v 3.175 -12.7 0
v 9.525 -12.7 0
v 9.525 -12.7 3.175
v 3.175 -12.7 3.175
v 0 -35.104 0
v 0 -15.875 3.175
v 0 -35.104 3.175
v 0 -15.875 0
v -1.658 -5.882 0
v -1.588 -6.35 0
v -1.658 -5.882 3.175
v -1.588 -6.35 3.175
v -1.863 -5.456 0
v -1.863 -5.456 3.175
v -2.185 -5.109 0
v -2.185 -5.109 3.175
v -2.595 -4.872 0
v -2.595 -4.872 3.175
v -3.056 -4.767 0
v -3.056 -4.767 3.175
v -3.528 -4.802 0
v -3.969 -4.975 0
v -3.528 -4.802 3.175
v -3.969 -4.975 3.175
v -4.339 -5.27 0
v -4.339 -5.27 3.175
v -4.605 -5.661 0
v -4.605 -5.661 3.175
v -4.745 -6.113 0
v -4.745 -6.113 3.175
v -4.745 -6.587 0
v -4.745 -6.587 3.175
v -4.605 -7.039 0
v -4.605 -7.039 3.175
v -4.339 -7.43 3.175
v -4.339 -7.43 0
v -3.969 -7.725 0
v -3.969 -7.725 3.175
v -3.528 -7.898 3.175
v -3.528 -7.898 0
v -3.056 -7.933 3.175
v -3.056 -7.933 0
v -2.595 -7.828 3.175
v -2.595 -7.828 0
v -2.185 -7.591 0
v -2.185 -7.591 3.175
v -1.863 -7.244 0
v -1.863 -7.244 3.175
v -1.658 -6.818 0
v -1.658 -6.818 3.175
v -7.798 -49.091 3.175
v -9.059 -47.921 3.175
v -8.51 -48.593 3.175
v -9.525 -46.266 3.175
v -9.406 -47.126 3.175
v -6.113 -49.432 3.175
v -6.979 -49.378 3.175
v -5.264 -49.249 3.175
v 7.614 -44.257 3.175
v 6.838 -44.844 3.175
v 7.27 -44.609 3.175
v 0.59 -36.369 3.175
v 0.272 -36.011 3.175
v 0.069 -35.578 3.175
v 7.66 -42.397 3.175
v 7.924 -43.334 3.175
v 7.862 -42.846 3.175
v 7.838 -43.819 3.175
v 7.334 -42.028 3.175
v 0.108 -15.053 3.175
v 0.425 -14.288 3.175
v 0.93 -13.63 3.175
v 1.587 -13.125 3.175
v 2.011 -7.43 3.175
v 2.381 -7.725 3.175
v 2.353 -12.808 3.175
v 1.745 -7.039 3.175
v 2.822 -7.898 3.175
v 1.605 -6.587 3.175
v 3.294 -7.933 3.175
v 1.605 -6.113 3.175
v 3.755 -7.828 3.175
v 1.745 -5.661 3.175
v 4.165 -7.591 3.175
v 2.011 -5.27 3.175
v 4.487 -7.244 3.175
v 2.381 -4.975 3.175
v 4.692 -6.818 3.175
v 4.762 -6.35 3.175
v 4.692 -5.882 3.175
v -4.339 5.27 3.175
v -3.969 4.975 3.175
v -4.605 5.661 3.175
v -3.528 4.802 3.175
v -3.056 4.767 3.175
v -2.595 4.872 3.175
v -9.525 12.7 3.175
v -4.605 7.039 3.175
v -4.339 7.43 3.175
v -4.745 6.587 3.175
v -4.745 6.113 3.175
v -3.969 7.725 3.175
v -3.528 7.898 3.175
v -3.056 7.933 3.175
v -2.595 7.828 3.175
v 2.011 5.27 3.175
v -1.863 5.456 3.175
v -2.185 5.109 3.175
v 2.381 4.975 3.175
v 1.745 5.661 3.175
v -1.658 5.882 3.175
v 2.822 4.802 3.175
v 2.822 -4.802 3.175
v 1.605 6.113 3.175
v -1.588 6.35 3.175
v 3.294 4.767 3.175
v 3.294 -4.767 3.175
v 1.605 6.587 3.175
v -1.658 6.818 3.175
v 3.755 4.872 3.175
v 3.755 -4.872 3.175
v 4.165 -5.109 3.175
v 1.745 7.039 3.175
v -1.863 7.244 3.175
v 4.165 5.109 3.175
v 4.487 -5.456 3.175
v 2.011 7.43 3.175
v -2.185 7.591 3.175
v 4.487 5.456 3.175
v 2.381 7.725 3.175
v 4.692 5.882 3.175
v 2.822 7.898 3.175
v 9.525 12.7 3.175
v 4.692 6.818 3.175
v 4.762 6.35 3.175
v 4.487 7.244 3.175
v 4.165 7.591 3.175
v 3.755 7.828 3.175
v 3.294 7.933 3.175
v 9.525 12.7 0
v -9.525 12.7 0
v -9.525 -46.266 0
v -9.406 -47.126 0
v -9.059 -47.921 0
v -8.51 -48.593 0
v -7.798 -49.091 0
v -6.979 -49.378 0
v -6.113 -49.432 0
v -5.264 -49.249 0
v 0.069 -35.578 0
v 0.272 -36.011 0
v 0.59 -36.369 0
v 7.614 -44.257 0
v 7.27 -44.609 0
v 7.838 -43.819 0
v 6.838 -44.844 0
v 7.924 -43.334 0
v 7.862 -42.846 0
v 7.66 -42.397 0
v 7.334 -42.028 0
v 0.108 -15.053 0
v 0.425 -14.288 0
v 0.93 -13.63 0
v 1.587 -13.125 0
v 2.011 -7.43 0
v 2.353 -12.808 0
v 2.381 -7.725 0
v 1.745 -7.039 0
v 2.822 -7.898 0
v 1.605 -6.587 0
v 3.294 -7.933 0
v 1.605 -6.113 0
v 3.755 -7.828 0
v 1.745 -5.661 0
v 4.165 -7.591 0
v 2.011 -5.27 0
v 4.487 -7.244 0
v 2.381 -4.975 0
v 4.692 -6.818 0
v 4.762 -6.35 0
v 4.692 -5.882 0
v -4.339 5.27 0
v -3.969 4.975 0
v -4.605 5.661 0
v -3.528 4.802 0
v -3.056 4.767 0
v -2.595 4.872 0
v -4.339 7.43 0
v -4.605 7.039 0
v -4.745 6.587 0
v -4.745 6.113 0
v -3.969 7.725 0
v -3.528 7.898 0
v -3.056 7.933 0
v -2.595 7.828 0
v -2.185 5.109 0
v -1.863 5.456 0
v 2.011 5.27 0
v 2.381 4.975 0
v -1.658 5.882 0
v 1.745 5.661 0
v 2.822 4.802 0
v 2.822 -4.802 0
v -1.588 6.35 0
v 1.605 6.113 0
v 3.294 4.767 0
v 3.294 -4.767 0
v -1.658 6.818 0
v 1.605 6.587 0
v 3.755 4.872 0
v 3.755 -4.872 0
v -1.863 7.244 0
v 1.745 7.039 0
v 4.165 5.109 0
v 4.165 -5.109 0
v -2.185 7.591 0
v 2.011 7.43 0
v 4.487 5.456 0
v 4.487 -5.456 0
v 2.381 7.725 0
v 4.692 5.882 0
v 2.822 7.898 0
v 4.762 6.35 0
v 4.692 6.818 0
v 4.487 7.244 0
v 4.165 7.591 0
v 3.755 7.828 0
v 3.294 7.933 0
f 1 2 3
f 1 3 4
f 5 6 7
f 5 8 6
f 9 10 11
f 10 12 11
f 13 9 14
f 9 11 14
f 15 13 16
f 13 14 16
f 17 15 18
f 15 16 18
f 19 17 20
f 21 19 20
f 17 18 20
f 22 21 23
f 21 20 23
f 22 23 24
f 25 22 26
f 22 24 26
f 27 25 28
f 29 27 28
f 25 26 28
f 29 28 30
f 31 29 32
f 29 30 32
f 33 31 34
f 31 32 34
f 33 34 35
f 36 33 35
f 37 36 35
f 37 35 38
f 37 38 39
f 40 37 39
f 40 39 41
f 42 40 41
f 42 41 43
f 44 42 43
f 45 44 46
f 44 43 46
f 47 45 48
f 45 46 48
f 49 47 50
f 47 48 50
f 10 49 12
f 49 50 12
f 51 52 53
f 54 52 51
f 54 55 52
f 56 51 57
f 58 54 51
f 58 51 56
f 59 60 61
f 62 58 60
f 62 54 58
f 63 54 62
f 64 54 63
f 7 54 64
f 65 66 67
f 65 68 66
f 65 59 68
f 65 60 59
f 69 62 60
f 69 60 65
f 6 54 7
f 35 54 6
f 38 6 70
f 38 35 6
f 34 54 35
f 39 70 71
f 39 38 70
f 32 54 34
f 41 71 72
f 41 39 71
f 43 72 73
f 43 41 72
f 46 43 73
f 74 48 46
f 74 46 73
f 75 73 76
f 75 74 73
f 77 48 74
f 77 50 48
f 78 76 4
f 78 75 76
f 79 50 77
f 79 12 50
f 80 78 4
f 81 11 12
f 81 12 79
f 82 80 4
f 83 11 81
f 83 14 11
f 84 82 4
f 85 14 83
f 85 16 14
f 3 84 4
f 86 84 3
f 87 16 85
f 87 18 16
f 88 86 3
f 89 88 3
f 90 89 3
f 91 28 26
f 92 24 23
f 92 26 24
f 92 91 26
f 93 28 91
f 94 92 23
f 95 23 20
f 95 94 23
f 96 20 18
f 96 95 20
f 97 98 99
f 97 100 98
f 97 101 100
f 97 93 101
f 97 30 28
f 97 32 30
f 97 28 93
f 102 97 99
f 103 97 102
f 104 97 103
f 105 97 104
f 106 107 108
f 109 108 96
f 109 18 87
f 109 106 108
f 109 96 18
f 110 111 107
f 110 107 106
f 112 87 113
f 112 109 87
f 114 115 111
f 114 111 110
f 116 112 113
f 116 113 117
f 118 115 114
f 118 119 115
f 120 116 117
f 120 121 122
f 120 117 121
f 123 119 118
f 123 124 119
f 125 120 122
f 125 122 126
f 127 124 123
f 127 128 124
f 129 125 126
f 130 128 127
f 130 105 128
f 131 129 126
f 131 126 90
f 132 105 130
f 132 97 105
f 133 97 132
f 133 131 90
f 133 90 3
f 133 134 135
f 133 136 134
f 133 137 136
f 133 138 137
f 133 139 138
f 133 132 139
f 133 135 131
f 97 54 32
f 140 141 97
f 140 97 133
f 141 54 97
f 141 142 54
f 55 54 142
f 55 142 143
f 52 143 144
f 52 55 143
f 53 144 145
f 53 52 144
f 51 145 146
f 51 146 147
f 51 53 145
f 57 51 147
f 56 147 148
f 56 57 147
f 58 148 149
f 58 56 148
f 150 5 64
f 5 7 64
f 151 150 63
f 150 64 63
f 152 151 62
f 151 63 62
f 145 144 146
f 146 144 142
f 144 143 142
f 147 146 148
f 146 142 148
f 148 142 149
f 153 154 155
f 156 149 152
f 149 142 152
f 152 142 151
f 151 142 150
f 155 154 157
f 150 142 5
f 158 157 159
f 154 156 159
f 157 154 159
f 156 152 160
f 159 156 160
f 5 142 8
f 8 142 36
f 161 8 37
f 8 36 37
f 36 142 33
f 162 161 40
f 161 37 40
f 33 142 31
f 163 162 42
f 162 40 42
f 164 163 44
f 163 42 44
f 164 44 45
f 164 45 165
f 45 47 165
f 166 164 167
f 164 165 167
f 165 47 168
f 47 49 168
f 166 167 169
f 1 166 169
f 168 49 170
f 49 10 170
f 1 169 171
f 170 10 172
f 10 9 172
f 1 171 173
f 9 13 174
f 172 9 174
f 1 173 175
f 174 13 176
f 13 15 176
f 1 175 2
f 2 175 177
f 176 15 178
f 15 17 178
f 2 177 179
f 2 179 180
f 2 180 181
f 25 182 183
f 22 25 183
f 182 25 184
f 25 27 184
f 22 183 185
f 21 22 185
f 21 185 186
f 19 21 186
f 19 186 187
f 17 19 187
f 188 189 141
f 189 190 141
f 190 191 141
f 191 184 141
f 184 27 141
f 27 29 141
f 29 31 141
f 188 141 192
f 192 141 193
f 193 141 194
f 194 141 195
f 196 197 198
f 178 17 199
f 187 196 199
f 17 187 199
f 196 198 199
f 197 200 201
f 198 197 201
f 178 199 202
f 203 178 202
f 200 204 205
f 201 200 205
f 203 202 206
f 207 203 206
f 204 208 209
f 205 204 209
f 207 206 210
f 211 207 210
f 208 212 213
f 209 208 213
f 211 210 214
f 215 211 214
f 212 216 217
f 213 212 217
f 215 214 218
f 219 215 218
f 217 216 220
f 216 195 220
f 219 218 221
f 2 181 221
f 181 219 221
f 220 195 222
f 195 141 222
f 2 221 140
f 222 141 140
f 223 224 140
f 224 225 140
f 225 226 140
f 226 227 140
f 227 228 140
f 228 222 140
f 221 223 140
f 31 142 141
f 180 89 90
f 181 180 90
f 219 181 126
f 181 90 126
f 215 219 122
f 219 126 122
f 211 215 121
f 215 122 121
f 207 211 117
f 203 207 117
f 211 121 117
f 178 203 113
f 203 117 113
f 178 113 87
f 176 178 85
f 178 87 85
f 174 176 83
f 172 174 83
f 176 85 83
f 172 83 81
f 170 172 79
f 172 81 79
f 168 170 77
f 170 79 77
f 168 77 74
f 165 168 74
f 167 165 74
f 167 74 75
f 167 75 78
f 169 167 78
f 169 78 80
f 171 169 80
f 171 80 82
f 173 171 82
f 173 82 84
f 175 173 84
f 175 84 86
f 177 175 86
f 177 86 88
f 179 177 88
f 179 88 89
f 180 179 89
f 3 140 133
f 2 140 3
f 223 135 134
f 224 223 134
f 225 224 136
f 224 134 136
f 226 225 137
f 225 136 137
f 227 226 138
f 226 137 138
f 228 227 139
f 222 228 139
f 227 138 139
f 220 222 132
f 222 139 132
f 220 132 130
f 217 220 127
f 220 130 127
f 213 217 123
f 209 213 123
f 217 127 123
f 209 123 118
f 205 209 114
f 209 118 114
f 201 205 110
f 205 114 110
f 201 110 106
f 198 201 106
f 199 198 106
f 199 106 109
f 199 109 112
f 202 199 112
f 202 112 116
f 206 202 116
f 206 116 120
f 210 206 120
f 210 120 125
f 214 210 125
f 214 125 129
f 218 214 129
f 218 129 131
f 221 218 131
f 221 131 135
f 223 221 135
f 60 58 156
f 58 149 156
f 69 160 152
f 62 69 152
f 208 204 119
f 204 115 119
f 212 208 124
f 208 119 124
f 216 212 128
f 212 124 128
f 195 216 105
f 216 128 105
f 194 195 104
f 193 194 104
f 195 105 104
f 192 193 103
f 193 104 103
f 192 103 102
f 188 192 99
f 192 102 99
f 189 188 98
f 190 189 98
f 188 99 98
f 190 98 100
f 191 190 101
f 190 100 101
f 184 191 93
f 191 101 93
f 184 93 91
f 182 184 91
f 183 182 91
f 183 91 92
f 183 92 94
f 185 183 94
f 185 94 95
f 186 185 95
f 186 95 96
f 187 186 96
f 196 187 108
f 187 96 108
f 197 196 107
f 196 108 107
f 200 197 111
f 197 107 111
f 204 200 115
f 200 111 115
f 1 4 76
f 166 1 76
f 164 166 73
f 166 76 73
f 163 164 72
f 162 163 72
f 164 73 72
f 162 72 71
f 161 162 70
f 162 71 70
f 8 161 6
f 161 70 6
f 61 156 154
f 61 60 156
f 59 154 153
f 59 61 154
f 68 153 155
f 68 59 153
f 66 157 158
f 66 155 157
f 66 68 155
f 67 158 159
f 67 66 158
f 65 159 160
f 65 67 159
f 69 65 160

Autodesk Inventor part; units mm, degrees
ref_plane "YZ Plane" through (0, 0, 0) normal (1, 0, 0) x (0, 1, 0)
ref_plane "XZ Plane" through (0, 0, 0) normal (0, 1, 0) x (-1, 0, 0)
ref_plane "XY Plane" through (0, 0, 0) normal (0, 0, 1) x (1, 0, 0)
sketch "Sketch1" plane through (0, 0, 0) normal (0, 0, 1) x (1, 0, 0)
  line L0 (9.525, -12.7) -> (-9.525, -12.7)
  line L1 (-9.525, -12.7) -> (-9.525, 12.7)
  line L2 (-9.525, 12.7) -> (9.525, 12.7)
  line L3 (9.525, 12.7) -> (9.525, -12.7)
  line L4 (9.525, -12.7) -> (-9.525, 12.7) construction
  line L5 (-9.525, -12.7) -> (9.525, 12.7) construction
  line L6 (-9.525, 12.7) -> (0, 12.7)
  line L7 (0, 12.7) -> (0, -50.8)
  line L8 (0, -50.8) -> (-9.525, -50.8)
  line L9 (-9.525, -50.8) -> (-9.525, 12.7)
  line L10 (-9.525, -50.8) -> (9.525, -43.8664)
  line L11 (-9.525, -50.8) -> (10.7476, -50.8) construction
  line L12 (9.525, -43.8664) -> (0, -35.8739)
  point P0 (0, 0)
  point P1 (0, -12.7)
  dimension "d0" = 19.05
  dimension "d1" = 25.4
  dimension "d2" = 63.5
  dimension "d3" = 20
  dimension "d4" = 60
extrude "Extrusion1" add sketch "Sketch1" along normal blind 3.175 contours L0 L7 L2 L3 | L7 L10 L9 L0 | L0 L1 L2 L7 | L12 L10 L7
sketch "Sketch2" plane through (0, 0, 3.175) normal (0, 0, 1) x (1, 0, 0)
  line L0 (-9.525, 12.7) -> (-9.525, -50.8) construction
  line L1 (-9.525, 0) -> (9.525, 0) construction
  line L2 (9.525, -12.7) -> (9.525, 12.7) construction
  line L3 (9.525, 12.7) -> (-9.525, 12.7) construction
  line L4 (0, -35.8739) -> (0, -12.7) construction
  line L5 (0, 12.7) -> (0, -12.7) construction
  circle A0 centre (3.175, 6.35) radius 1.5875
  circle A1 centre (3.175, -6.35) radius 1.5875
  circle A2 centre (-3.175, -6.35) radius 1.5875
  circle A3 centre (-3.175, 6.35) radius 1.5875
  line L6 (0, -12.7) -> (9.525, -12.7) projected
  point P0 (0, 0)
  dimension "d7" = 3.175
  dimension "d8" = 3.175
  dimension "d9" = 3.175
  dimension "d10" = 3.175
  dimension "d11" = 6.35
  dimension "d12" = 6.35
  dimension "d13" = 6.35
  dimension "d14" = 6.35
  dimension "d15" = 6.35
  dimension "d16" = 6.35
  dimension "d17" = 6.35
  dimension "d18" = 6.35
  dimension "d19" = 12.7
extrude "Extrusion2" cut sketch "Sketch2" against normal through all
fillet "Fillet1" radius 3.175 2 edges at (-9.525, -50.8, 1.5875) (0, -12.7, 1.5875)
fillet "Fillet2" radius 1.651 2 edges at (9.525, -43.8664, 1.5875) (0, -35.8739, 1.5875)
properties part number "CS_Climb_Hooks"
